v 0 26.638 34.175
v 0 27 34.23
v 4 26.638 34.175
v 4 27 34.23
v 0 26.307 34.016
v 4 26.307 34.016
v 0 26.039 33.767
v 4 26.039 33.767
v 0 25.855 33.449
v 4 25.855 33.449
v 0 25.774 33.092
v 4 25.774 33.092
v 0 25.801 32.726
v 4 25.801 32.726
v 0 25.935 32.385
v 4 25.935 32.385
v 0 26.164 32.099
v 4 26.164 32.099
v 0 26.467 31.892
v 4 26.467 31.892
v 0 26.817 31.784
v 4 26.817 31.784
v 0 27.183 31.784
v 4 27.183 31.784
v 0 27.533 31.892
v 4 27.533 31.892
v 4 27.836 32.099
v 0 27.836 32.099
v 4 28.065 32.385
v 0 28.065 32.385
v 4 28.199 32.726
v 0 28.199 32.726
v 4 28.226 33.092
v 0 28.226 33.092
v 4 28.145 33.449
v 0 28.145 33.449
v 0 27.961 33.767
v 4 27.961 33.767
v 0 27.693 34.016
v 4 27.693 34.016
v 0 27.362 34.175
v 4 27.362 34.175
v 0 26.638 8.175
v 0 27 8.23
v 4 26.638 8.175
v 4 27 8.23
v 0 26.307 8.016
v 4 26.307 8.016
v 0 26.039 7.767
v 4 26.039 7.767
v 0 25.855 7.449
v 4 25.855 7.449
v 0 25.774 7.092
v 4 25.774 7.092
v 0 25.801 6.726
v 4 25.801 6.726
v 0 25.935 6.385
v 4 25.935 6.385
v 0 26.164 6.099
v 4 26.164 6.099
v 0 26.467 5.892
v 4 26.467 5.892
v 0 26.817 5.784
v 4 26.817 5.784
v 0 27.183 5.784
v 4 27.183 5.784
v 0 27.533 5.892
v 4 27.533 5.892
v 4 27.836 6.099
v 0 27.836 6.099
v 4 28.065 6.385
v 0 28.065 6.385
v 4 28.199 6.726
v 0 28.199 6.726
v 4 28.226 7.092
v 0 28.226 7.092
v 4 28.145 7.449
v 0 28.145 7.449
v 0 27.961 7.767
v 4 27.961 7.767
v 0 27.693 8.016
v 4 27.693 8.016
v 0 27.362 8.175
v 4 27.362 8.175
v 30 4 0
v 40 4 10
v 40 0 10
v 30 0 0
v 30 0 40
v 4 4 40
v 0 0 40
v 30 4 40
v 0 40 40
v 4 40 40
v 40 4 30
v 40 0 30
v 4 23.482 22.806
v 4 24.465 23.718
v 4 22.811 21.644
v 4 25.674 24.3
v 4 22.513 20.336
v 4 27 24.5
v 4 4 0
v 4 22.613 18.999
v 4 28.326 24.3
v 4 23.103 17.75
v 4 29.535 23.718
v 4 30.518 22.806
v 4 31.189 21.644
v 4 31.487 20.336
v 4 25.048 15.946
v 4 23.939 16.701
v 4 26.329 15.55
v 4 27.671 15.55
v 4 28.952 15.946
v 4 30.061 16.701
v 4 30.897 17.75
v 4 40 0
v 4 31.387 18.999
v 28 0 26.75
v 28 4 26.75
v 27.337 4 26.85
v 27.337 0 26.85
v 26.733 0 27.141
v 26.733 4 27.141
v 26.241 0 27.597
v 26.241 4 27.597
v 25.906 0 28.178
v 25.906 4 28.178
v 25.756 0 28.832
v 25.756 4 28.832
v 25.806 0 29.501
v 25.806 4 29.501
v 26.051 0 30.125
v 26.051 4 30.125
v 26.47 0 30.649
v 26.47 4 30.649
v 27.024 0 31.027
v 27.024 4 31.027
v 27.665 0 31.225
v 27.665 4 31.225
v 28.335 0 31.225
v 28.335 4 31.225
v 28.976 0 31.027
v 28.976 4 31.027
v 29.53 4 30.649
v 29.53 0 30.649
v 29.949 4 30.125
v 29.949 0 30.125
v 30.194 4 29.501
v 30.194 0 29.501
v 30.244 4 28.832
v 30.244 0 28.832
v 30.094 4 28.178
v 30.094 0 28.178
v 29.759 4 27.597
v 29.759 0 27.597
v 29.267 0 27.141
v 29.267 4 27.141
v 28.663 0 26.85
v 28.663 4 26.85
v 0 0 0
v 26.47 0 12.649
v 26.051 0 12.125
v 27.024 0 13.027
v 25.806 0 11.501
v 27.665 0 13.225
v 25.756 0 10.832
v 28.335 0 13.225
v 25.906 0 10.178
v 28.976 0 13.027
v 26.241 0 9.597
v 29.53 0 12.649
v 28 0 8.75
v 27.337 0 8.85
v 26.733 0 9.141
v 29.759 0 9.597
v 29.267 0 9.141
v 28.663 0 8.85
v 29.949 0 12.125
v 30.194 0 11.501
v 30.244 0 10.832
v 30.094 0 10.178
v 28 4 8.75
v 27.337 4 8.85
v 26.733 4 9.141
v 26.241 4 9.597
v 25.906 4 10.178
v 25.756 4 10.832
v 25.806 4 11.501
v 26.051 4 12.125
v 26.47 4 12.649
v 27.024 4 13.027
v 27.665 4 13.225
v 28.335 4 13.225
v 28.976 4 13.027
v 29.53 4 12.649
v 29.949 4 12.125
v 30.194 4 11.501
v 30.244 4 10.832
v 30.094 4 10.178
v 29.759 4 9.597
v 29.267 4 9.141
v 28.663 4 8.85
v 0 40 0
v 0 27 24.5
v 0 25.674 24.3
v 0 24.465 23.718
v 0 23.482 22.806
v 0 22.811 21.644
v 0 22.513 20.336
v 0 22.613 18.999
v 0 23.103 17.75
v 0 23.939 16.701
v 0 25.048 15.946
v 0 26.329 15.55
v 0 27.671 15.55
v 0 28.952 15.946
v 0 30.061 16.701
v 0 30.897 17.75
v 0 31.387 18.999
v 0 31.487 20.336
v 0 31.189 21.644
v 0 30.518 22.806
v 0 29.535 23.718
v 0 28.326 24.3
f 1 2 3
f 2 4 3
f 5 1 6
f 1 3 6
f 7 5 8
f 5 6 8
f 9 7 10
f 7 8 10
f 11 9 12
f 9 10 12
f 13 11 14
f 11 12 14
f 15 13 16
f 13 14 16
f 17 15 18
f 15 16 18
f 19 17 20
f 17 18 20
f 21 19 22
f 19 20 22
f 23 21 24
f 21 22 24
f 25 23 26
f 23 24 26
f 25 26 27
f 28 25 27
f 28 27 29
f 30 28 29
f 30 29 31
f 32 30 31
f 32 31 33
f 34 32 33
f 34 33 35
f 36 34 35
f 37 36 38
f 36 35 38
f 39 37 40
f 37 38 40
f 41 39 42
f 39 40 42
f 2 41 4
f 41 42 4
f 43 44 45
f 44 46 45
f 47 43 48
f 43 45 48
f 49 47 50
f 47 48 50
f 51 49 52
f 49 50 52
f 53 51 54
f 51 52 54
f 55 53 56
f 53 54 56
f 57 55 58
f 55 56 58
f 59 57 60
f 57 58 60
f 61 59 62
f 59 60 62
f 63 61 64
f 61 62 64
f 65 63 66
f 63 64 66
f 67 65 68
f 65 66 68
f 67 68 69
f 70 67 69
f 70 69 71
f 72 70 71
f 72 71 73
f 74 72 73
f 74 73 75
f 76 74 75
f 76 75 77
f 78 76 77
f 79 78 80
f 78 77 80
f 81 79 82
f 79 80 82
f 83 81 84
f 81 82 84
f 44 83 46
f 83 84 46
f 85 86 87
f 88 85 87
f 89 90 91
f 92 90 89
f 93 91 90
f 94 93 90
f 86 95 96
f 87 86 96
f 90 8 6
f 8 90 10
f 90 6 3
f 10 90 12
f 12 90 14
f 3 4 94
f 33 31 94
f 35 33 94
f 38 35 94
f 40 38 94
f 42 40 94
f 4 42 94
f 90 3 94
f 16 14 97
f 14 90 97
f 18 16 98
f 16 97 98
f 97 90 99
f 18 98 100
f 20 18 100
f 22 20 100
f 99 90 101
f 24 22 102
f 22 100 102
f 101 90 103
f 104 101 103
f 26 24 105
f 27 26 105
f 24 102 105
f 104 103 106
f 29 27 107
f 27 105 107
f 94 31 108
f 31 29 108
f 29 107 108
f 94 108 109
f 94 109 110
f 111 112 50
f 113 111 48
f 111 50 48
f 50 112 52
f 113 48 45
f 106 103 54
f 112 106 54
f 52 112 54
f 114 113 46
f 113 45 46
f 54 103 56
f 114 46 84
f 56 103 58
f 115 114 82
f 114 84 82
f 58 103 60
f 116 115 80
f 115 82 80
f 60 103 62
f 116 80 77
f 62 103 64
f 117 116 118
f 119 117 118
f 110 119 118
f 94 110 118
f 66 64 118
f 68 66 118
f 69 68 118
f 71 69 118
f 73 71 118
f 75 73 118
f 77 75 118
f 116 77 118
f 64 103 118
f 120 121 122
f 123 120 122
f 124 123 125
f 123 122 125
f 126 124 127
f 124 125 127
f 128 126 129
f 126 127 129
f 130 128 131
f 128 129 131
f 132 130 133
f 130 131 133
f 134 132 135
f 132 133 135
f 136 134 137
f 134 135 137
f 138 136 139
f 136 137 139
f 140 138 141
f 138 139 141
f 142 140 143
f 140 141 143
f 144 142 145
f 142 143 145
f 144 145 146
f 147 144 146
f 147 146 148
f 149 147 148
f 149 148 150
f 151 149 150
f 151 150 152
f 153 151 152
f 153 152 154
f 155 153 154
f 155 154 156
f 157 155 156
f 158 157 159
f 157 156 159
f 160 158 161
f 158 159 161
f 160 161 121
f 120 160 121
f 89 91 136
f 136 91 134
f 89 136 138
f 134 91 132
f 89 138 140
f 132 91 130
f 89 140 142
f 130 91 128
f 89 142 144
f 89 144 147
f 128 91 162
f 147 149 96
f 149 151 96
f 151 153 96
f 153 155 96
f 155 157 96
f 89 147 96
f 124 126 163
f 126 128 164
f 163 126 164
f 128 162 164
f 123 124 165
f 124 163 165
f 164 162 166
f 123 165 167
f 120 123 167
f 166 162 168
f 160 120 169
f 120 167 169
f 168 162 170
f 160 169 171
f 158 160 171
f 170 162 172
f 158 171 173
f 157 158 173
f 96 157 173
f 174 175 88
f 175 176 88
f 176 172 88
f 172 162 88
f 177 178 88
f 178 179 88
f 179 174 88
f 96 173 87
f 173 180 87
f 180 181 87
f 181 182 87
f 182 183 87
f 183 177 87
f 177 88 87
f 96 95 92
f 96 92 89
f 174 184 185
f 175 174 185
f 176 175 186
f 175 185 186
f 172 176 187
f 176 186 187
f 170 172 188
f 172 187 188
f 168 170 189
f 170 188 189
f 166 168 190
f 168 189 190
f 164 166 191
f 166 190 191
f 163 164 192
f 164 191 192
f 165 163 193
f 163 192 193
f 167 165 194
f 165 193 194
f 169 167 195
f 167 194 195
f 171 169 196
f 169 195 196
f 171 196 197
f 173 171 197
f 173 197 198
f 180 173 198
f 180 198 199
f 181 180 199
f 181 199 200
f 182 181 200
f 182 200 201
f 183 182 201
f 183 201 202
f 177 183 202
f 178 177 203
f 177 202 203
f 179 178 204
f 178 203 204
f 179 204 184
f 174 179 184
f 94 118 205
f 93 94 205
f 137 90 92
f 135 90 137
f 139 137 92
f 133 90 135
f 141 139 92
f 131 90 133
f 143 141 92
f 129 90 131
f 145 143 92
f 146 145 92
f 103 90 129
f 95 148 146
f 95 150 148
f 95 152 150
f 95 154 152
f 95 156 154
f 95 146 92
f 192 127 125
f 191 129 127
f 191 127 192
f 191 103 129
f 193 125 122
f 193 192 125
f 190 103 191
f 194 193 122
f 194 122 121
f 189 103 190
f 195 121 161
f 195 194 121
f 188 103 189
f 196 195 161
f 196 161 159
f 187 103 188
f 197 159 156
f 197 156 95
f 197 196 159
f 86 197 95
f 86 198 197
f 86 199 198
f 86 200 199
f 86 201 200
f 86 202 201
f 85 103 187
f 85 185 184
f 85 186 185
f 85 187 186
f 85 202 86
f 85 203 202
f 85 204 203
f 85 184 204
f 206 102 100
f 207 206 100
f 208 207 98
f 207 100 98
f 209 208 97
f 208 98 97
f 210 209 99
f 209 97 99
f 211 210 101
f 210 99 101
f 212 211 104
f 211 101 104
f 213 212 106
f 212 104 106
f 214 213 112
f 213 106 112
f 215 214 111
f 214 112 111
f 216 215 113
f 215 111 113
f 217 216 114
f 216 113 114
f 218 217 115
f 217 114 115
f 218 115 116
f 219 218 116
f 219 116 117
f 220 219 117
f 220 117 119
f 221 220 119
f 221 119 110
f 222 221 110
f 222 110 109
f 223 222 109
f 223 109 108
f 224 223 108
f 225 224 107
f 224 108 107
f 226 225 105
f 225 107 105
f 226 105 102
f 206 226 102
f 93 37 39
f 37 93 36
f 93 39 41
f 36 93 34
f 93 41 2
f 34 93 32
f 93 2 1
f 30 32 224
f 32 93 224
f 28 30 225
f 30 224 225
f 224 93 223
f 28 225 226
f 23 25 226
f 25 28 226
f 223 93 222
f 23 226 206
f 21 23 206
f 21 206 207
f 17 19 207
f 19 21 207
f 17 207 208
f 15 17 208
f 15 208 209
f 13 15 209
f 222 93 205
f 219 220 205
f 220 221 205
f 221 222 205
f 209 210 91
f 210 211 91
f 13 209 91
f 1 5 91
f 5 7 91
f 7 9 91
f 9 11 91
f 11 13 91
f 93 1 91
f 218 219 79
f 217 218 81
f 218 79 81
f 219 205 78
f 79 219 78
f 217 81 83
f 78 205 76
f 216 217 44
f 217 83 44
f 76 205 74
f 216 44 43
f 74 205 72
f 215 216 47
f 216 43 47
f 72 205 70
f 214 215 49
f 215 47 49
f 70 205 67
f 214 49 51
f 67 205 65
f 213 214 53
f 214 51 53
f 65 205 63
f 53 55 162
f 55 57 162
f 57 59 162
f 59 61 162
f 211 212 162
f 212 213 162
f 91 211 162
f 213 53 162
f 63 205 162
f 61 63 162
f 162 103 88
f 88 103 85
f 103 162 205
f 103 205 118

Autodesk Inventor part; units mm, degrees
ref_plane "YZ Plane" through (0, 0, 0) normal (1, 0, 0) x (0, 1, 0)
ref_plane "XZ Plane" through (0, 0, 0) normal (0, 1, 0) x (-1, 0, 0)
ref_plane "XY Plane" through (0, 0, 0) normal (0, 0, 1) x (1, 0, 0)
sketch "Skizze1" plane through (0, 0, 0) normal (0, 0, 1) x (1, 0, 0)
  line L0 (0, 0) -> (40, 0)
  line L1 (4, 4) -> (4, 40)
  line L2 (4, 40) -> (0, 40)
  line L3 (0, 40) -> (0, 0)
  line L4 (4, 4) -> (40, 4)
  line L5 (40, 4) -> (40, 0)
  line L6 (-8, 0) -> (48, 0) projected
  line L7 (0, -8) -> (0, 48) projected
  dimension "d0" = 40
  dimension "d3" = 40
  dimension "d4" = 4
extrude "Extrusion1" add sketch "Skizze1" along normal blind 40
sketch "Skizze2" plane through (0, 0, 0) normal (-1, 0, 0) x (0, 0, 1)
  line L0 (0, 40) -> (40, 40) projected
  line L1 (0, 0) -> (40, 0) projected
  line L2 (20, 40) -> (20, 0)
  point P0 (20, 27)
  dimension "d7" = 27
hole "Bohrung1" at (0, 27, 20) direction (1, 0, 0) diameter 9 end through all
sketch "Skizze3" plane through (0, 0, 0) normal (-1, 0, 0) x (0, 0, 1)
  circle A0 centre (20, 27) radius 4.5 projected
  line L0 (0, 40) -> (40, 40) projected
  line L1 (0, 0) -> (40, 0) projected
  line L2 (15.0773, 27) -> (4.7258, 27)
  line L3 (0, -8) -> (0, 48) projected
  line L4 (-8, 0) -> (48, 0) projected
  line L5 (20, 27) -> (20, 40)
  point P0 (7, 27)
  point P1 (33, 27)
  dimension "d15" = 13
  dimension "d16" = 26
hole "Bohrung2" at (0, 27, 7) at (0, 27, 33) direction (1, 0, 0) diameter 2.459 end through all thread size "M3x0.5" class "6H" standard "ISO Metric profile"
sketch "Skizze4" plane through (0, 0, 0) normal (0, -1, 0) x (1, 0, 0)
  line L0 (40, 40) -> (0, 40) projected
  line L1 (0, 0) -> (0, 40) projected
  line L2 (0, 0) -> (40, 0) projected
  line L3 (40, 0) -> (40, 40) projected
  line L4 (28, 40) -> (28, 0)
  line L5 (0, 20) -> (40, 20)
  point P0 (28, 29)
  point P1 (28, 11)
  dimension "d24" = 12
  dimension "d25" = 18
hole "Bohrung3" at (28, 0, 29) at (28, 0, 11) direction (0, 1, 0) diameter 4.5 end through all
chamfer "Fase1" distance 10 angle 45 2 edges at (40, 2, 40) (40, 2, 0)
properties part number "13_0204_056"
